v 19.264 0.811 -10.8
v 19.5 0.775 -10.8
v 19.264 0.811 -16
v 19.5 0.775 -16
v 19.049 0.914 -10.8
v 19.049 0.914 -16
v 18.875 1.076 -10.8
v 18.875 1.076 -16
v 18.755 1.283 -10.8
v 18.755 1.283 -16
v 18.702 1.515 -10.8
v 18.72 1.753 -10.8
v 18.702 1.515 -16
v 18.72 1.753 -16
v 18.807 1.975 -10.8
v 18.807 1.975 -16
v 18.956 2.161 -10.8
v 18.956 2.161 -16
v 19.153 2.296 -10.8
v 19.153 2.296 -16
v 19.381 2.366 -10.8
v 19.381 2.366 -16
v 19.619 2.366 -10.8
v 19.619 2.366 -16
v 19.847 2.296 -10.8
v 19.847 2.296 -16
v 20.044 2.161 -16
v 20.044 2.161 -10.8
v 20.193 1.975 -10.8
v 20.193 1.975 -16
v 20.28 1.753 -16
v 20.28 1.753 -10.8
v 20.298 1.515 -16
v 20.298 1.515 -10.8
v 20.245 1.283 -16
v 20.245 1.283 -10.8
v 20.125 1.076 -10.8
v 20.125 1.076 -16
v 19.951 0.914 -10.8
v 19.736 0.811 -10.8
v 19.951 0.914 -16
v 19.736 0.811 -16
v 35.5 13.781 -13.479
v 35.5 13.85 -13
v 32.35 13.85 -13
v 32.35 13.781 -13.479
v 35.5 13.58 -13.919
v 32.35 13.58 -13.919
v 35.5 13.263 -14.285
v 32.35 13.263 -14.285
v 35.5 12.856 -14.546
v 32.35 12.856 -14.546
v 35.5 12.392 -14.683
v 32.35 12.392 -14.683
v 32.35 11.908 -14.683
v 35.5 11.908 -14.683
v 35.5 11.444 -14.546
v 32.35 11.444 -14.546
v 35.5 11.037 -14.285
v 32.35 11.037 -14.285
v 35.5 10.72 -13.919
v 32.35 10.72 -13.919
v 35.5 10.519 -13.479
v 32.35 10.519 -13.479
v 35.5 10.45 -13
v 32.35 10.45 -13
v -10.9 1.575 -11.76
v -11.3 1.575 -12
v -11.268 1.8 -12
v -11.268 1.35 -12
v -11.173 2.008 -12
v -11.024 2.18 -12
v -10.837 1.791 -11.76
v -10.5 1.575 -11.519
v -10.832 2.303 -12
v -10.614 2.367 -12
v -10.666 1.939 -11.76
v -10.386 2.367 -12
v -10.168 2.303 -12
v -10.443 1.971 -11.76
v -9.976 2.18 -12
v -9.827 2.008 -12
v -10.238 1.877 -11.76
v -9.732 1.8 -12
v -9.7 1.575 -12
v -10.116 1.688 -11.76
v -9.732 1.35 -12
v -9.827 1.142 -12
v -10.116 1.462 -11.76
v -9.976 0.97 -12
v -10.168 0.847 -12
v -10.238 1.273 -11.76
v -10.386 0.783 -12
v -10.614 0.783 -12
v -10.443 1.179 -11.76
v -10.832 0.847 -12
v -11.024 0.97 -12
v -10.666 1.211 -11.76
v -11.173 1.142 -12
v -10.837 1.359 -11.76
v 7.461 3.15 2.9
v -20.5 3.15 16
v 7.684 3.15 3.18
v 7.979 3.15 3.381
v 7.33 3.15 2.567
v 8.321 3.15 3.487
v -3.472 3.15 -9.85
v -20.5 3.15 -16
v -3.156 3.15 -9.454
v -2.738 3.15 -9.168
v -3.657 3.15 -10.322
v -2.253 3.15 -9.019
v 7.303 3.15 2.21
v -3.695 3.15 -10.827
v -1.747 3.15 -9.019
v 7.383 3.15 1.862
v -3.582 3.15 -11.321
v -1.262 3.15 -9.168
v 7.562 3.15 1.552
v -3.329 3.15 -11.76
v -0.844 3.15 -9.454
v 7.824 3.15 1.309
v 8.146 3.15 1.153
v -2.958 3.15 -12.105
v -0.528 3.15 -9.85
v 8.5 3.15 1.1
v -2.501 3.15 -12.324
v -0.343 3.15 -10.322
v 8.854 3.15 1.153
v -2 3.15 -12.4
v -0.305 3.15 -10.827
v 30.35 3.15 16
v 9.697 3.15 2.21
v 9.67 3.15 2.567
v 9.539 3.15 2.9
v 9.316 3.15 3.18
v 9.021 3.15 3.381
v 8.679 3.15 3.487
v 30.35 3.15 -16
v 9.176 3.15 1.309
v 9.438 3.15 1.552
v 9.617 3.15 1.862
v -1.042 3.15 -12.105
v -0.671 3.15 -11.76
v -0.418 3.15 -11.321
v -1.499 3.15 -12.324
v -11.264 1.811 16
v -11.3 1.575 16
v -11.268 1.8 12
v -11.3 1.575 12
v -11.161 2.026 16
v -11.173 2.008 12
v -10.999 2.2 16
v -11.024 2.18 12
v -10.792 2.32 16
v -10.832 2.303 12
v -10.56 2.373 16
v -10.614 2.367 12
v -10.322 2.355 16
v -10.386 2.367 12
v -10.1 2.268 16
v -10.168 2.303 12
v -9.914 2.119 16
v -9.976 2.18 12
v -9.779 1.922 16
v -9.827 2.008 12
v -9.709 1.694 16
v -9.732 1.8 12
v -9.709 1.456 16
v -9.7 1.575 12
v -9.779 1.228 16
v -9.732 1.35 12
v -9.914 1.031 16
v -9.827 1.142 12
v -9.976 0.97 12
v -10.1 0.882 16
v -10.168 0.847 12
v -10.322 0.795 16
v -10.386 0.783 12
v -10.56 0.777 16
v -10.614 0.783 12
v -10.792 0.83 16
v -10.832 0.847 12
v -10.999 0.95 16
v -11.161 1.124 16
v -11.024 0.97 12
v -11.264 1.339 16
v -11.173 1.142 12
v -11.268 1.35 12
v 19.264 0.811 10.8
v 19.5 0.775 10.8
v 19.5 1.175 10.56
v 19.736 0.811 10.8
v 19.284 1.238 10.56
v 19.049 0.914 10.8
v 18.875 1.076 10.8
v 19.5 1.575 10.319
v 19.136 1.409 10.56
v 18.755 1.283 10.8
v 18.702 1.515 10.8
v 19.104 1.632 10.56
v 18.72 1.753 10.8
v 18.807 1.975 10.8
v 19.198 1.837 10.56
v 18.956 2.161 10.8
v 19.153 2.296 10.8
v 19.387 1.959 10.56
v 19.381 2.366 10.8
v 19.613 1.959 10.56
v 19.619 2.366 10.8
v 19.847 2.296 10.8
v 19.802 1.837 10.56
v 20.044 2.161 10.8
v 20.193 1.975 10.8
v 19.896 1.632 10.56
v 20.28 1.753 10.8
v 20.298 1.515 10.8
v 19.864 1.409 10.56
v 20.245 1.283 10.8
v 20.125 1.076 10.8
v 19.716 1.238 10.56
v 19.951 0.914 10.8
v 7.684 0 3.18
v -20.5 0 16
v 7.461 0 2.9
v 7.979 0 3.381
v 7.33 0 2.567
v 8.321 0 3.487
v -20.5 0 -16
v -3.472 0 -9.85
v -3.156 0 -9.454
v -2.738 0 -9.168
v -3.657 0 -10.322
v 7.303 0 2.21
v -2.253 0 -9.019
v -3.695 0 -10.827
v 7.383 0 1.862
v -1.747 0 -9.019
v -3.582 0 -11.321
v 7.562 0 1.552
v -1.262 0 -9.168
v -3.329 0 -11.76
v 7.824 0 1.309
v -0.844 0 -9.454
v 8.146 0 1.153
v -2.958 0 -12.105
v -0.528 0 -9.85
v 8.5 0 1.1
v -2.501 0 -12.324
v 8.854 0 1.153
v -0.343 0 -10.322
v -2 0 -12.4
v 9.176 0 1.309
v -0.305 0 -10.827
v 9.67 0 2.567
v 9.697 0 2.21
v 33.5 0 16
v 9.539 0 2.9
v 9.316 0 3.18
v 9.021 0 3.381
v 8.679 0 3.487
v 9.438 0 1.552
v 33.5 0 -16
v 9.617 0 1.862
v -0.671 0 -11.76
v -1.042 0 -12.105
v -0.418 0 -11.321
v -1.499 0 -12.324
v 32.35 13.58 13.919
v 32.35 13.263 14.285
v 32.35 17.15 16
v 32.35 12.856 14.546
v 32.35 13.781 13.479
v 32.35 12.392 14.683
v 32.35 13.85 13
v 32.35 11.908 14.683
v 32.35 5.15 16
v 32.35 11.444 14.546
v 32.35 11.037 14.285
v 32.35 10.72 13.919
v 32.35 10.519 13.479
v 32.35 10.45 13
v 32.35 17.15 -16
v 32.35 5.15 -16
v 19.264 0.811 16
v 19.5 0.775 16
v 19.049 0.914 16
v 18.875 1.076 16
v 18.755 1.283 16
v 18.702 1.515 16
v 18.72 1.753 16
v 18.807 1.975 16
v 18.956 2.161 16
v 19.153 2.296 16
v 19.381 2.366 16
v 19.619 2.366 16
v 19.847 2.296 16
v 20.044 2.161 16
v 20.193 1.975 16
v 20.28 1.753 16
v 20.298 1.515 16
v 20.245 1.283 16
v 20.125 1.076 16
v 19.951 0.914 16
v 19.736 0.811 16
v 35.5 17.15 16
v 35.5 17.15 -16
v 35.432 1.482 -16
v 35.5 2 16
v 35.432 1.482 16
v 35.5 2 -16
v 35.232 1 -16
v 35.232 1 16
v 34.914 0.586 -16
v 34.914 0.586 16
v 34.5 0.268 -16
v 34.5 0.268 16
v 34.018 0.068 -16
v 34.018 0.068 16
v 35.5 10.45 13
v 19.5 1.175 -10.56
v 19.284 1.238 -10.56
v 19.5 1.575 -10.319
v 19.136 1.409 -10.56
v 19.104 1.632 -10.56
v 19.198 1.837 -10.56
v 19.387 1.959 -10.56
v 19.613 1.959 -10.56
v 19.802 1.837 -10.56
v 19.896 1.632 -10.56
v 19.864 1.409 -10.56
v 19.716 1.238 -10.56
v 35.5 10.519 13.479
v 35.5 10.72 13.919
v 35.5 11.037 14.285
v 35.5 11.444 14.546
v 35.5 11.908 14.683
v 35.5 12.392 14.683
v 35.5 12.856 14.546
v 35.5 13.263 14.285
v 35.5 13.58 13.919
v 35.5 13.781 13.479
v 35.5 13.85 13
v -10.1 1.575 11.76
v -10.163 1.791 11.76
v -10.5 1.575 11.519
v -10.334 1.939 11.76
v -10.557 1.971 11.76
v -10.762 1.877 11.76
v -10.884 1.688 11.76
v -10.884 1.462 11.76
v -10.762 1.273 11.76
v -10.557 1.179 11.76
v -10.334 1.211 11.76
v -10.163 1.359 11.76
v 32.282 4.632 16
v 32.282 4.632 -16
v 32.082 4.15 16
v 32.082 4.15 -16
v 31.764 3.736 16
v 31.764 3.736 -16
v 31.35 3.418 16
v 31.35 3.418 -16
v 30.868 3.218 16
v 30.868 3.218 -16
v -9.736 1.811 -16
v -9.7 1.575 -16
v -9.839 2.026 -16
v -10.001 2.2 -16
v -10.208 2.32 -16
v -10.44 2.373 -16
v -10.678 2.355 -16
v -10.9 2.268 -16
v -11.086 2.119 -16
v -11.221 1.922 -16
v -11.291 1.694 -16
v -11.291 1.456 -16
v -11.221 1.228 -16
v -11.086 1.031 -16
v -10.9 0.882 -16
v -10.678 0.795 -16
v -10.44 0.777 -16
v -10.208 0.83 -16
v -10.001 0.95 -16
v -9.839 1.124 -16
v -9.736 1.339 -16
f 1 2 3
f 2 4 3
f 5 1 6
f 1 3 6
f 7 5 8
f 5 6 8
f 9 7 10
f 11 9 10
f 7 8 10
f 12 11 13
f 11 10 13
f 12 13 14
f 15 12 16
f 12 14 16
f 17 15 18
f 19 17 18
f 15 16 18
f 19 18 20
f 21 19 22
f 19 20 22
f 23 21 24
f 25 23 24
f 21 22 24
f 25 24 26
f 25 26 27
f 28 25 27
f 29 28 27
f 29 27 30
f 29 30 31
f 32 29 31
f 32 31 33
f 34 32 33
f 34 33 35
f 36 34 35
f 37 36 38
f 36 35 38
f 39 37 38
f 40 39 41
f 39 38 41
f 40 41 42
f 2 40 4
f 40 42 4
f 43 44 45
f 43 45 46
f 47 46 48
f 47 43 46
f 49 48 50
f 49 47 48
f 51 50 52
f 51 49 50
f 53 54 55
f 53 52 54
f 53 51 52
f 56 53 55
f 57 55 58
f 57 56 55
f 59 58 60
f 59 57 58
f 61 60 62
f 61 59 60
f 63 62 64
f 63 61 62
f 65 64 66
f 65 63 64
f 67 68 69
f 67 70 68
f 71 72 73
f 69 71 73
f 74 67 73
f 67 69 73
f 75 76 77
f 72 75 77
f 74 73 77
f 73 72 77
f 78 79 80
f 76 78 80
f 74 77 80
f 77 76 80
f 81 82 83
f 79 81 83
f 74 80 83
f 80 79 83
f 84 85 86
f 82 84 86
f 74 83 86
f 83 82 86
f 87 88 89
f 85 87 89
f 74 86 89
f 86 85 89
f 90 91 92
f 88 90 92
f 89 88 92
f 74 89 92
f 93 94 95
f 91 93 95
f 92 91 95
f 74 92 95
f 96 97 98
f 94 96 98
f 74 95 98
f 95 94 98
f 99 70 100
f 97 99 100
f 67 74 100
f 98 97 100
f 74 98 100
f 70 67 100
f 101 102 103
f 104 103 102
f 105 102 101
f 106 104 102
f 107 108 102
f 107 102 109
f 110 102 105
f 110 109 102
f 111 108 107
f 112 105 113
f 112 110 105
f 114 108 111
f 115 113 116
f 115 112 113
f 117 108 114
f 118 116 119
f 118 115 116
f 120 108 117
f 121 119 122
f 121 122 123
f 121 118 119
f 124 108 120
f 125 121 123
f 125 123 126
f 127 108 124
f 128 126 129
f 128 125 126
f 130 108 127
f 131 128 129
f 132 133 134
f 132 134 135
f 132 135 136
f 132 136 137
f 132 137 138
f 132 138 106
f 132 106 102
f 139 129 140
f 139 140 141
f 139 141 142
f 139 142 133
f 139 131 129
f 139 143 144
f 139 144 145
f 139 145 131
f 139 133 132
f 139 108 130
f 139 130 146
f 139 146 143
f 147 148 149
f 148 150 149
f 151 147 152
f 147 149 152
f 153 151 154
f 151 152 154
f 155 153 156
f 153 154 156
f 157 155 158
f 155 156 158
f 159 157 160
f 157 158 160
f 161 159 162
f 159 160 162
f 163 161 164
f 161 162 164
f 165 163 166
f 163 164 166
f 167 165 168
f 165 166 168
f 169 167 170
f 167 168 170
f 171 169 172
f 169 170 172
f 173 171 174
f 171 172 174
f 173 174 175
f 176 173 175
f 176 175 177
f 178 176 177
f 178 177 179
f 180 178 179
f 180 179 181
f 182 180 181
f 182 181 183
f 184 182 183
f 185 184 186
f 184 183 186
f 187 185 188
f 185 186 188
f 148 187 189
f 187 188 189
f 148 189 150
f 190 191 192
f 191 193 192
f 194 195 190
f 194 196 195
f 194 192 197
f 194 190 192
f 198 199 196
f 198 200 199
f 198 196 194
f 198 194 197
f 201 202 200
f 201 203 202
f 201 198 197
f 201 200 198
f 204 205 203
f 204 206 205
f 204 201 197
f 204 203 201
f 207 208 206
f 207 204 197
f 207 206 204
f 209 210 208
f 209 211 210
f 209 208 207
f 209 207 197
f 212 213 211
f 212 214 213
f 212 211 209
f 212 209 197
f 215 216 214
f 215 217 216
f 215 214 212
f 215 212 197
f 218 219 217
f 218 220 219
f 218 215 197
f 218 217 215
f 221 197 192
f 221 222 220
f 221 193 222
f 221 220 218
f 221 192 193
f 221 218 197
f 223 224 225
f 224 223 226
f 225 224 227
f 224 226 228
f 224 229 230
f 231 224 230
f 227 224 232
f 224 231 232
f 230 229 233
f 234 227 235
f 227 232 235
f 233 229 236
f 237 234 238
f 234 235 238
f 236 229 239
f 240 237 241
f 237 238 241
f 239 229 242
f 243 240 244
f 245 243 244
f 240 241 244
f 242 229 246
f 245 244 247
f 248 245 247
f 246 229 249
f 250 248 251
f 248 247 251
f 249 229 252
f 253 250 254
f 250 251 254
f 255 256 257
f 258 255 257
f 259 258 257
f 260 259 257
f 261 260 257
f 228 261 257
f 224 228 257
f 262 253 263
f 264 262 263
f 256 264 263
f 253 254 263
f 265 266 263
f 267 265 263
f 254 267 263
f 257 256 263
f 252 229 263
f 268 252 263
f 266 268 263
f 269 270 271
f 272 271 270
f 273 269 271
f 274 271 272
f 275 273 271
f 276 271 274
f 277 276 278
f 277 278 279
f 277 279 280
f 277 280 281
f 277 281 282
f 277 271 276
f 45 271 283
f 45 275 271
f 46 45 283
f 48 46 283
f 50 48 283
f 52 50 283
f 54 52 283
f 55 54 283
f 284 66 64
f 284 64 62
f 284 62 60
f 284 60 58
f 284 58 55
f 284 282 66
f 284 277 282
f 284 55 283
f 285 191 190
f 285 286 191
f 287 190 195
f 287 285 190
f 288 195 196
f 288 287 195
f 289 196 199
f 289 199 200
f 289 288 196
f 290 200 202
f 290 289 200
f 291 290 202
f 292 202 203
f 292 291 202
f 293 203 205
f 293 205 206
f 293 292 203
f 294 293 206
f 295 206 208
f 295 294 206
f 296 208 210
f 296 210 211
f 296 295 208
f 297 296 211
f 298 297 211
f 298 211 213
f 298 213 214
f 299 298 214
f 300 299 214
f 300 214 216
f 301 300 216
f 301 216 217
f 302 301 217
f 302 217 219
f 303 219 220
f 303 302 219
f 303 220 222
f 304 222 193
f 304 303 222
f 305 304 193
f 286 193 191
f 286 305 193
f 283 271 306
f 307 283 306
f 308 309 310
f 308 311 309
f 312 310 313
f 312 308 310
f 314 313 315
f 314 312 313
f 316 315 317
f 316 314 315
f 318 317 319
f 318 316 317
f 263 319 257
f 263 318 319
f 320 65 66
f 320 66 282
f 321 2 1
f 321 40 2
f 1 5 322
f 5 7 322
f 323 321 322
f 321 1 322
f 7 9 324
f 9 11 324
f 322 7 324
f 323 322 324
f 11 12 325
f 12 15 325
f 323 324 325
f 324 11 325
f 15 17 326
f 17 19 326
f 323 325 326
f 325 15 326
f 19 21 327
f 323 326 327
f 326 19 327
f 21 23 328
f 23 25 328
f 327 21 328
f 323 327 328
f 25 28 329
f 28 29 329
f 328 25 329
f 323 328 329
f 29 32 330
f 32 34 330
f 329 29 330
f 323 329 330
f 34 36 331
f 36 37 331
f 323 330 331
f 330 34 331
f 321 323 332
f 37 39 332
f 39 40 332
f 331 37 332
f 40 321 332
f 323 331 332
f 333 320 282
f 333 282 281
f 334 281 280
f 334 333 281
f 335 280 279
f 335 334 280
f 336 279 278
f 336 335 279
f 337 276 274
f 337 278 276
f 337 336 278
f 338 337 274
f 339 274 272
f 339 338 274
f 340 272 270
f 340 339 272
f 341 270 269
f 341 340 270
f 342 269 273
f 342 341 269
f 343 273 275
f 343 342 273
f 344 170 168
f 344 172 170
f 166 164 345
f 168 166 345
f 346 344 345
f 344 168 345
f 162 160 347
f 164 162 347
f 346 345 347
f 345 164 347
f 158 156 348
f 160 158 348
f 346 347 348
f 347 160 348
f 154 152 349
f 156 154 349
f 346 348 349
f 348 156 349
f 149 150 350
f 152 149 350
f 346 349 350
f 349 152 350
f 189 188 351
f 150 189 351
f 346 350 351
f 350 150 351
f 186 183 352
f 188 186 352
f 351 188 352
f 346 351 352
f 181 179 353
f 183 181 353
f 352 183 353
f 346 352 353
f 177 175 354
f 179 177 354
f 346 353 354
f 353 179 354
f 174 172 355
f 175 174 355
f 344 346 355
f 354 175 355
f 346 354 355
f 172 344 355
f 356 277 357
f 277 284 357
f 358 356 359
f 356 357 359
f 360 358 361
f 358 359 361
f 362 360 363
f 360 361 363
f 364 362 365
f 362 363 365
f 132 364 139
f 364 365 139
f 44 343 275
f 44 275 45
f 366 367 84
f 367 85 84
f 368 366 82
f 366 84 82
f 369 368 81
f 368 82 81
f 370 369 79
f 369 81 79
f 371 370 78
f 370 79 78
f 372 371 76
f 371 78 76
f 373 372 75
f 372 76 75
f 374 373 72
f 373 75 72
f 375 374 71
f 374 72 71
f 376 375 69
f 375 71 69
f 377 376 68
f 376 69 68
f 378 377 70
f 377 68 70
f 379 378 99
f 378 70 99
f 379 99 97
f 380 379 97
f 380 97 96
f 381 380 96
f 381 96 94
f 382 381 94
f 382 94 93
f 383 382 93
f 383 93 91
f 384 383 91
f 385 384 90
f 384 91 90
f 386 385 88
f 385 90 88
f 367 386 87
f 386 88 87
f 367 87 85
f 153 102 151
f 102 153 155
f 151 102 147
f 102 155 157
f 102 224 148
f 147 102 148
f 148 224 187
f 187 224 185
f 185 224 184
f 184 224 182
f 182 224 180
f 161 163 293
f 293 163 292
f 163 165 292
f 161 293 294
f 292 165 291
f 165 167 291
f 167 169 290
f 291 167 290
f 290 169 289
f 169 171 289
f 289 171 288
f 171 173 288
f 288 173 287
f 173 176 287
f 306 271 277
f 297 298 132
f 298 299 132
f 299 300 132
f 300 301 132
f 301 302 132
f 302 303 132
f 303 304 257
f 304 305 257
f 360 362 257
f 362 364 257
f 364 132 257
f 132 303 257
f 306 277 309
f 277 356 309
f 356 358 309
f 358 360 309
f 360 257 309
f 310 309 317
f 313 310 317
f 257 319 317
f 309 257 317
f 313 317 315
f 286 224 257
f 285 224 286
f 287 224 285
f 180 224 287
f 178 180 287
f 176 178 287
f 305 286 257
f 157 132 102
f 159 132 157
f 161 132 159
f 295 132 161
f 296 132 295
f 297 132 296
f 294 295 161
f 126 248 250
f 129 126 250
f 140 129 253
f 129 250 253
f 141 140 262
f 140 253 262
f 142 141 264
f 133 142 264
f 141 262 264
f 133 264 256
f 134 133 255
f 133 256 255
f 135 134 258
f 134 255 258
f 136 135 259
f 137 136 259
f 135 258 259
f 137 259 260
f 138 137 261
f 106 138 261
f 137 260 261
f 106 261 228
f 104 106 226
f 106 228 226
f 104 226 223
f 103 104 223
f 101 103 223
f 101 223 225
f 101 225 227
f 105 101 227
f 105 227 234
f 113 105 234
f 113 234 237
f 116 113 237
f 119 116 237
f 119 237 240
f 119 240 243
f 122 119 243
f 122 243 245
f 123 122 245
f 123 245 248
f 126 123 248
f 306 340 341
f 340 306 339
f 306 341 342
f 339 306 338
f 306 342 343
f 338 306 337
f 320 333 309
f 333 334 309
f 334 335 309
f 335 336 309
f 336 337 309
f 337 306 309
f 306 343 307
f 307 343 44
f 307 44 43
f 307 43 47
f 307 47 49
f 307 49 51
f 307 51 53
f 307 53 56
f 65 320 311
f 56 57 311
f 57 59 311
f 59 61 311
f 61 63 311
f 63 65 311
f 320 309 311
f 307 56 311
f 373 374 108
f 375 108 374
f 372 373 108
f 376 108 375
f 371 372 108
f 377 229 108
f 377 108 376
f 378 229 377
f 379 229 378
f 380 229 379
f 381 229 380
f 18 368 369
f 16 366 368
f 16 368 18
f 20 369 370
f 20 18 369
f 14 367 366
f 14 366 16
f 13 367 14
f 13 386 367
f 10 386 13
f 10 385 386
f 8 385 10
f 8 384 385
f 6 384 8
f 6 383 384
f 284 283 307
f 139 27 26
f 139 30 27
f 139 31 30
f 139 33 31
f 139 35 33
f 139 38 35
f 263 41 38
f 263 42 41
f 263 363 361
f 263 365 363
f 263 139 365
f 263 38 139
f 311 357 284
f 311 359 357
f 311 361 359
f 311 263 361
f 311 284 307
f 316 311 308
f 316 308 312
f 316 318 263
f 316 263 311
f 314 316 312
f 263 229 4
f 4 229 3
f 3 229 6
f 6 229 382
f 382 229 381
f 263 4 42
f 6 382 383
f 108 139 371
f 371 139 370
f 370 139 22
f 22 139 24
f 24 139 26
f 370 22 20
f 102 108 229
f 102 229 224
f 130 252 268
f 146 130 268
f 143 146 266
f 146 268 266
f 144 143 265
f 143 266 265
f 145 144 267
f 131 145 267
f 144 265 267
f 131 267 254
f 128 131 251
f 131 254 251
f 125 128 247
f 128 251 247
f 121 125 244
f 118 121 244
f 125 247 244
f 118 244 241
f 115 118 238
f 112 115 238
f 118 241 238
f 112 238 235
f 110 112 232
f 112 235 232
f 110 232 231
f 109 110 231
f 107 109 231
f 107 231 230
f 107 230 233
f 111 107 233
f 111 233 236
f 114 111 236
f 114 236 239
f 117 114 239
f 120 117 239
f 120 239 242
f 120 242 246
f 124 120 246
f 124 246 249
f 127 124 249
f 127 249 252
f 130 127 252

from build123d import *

# Parameters (mm, degrees)
SKETCH_1_W                       = 71
SKETCH_1_H                       = 32
EXTRUDE_1_DEPTH                  = 3.15
SKETCH_2_W                       = 3.15
SKETCH_2_H                       = 32
EXTRUDE_2_DEPTH                  = 14
FILLET_1_R                       = 2
SKETCH_3_R                       = 1.7
SKETCH_3_R_2                     = 1.2
CUT_EXTRUDE_1_DEPTH              = 43.548472358
CUT_EXTRUDE_2_DEPTH              = 75.773808917
SKETCH_7_W                       = 32
SKETCH_7_H                       = 3.15
CUT_EXTRUDE_3_DEPTH              = 15
HOLE_WIZARD_M2_2_D               = 1.6
HOLE_WIZARD_M2_2_DEPTH           = 4
HOLE_WIZARD_M2_2_TIP             = 0.480688495
HOLE_WIZARD_M2_2_ON_FACE_2_D     = 1.6
HOLE_WIZARD_M2_2_ON_FACE_2_DEPTH = 4
HOLE_WIZARD_M2_2_ON_FACE_2_TIP   = 0.480688495


with BuildPart() as part:
    # 草图1 → 凸台-拉伸1 (new body)
    with BuildSketch(Plane(origin=(0, 0, 0), x_dir=(1, 0, 0), z_dir=(0, 1, 0))):
        Rectangle(SKETCH_1_W, SKETCH_1_H)
    extrude(amount=EXTRUDE_1_DEPTH)

    # 草图2 → 凸台-拉伸2 (add)
    with BuildSketch(Plane(origin=(0, 3.15, 0), x_dir=(1, 0, 0), z_dir=(0, 1, 0))):
        with Locations((33.925, 0)):
            Rectangle(SKETCH_2_W, SKETCH_2_H)
    extrude(amount=EXTRUDE_2_DEPTH)

    # 圆角1
    fillet_1_edges = [part.edges().sort_by_distance(p)[0] for p in [
        (32.35, 3.15, 0),
        (35.5, 0, 0),
    ]]
    fillet(fillet_1_edges, radius=FILLET_1_R)

    # 草图3 → 切除-拉伸1 (cut, through all)
    with BuildSketch(Plane.XZ):
        with Locations(Location((-2, -10.7, 0), (0, 0, 270))):
            Circle(SKETCH_3_R)
        with Locations(Location((8.5, 2.3, 0), (0, 0, 270))):
            Circle(SKETCH_3_R_2)
    extrude(amount=-CUT_EXTRUDE_1_DEPTH, mode=Mode.SUBTRACT)

    # 草图5 → M2x0.4 螺纹孔1 (revolve, cut)
    with BuildSketch(Plane(origin=(19.5, 1.575, 16), x_dir=(0, -1, 0), z_dir=(1, 0, 0))):
        Polygon((0, 0), (0, 5.680688495), (0.8, 5.2), (0.8, 0), align=None)
    m2x0_4_1 = revolve(axis=Axis((19.5, 1.575, 22.35), (0, 0, -1)), mode=Mode.SUBTRACT)

    # 镜向1: M2x0.4 螺纹孔1 across plane
    add(m2x0_4_1.mirror(Plane.XY), mode=Mode.SUBTRACT)

    # 草图6 → 切除-拉伸2 (cut, through all)
    with BuildSketch(Plane(origin=(35.5, 0, 0), x_dir=(0, 0, -1), z_dir=(1, 0, 0))):
        with BuildLine():
            Line((-13, 13.85), (13, 13.85))
            ThreePointArc((13, 13.85), (14.7, 12.15), (13, 10.45))
            Line((13, 10.45), (-13, 10.45))
            ThreePointArc((-13, 10.45), (-14.7, 12.15), (-13, 13.85))
        make_face()
    extrude(amount=-CUT_EXTRUDE_2_DEPTH, mode=Mode.SUBTRACT)

    # 草图7 → 切除-拉伸3 (cut)
    with BuildSketch(Plane.ZY.offset(35.5)):
        with Locations((0, 1.575)):
            Rectangle(SKETCH_7_W, SKETCH_7_H)
    extrude(amount=-CUT_EXTRUDE_3_DEPTH, mode=Mode.SUBTRACT)

    # M2 螺纹孔2
    with Locations(Plane(origin=(-10.5, 1.575, 16), x_dir=(1, 0, 0), z_dir=(0, 0, 1))):
        with Locations((0, 0)):
            Hole(HOLE_WIZARD_M2_2_D / 2, depth=HOLE_WIZARD_M2_2_DEPTH)
            with Locations((0, 0, -(HOLE_WIZARD_M2_2_DEPTH + HOLE_WIZARD_M2_2_TIP / 2))):  # 118° drill point
                Cone(0, HOLE_WIZARD_M2_2_D / 2, HOLE_WIZARD_M2_2_TIP, mode=Mode.SUBTRACT)

    # M2 螺纹孔2 on face 2
    with Locations(Plane(origin=(-10.5, 1.575, -16), x_dir=(-1, 0, 0), z_dir=(0, 0, -1))):
        with Locations((0, 0)):
            Hole(HOLE_WIZARD_M2_2_ON_FACE_2_D / 2, depth=HOLE_WIZARD_M2_2_ON_FACE_2_DEPTH)
            with Locations((0, 0, -(HOLE_WIZARD_M2_2_ON_FACE_2_DEPTH + HOLE_WIZARD_M2_2_ON_FACE_2_TIP / 2))):  # 118° drill point
                Cone(0, HOLE_WIZARD_M2_2_ON_FACE_2_D / 2, HOLE_WIZARD_M2_2_ON_FACE_2_TIP, mode=Mode.SUBTRACT)


solid = part.part
